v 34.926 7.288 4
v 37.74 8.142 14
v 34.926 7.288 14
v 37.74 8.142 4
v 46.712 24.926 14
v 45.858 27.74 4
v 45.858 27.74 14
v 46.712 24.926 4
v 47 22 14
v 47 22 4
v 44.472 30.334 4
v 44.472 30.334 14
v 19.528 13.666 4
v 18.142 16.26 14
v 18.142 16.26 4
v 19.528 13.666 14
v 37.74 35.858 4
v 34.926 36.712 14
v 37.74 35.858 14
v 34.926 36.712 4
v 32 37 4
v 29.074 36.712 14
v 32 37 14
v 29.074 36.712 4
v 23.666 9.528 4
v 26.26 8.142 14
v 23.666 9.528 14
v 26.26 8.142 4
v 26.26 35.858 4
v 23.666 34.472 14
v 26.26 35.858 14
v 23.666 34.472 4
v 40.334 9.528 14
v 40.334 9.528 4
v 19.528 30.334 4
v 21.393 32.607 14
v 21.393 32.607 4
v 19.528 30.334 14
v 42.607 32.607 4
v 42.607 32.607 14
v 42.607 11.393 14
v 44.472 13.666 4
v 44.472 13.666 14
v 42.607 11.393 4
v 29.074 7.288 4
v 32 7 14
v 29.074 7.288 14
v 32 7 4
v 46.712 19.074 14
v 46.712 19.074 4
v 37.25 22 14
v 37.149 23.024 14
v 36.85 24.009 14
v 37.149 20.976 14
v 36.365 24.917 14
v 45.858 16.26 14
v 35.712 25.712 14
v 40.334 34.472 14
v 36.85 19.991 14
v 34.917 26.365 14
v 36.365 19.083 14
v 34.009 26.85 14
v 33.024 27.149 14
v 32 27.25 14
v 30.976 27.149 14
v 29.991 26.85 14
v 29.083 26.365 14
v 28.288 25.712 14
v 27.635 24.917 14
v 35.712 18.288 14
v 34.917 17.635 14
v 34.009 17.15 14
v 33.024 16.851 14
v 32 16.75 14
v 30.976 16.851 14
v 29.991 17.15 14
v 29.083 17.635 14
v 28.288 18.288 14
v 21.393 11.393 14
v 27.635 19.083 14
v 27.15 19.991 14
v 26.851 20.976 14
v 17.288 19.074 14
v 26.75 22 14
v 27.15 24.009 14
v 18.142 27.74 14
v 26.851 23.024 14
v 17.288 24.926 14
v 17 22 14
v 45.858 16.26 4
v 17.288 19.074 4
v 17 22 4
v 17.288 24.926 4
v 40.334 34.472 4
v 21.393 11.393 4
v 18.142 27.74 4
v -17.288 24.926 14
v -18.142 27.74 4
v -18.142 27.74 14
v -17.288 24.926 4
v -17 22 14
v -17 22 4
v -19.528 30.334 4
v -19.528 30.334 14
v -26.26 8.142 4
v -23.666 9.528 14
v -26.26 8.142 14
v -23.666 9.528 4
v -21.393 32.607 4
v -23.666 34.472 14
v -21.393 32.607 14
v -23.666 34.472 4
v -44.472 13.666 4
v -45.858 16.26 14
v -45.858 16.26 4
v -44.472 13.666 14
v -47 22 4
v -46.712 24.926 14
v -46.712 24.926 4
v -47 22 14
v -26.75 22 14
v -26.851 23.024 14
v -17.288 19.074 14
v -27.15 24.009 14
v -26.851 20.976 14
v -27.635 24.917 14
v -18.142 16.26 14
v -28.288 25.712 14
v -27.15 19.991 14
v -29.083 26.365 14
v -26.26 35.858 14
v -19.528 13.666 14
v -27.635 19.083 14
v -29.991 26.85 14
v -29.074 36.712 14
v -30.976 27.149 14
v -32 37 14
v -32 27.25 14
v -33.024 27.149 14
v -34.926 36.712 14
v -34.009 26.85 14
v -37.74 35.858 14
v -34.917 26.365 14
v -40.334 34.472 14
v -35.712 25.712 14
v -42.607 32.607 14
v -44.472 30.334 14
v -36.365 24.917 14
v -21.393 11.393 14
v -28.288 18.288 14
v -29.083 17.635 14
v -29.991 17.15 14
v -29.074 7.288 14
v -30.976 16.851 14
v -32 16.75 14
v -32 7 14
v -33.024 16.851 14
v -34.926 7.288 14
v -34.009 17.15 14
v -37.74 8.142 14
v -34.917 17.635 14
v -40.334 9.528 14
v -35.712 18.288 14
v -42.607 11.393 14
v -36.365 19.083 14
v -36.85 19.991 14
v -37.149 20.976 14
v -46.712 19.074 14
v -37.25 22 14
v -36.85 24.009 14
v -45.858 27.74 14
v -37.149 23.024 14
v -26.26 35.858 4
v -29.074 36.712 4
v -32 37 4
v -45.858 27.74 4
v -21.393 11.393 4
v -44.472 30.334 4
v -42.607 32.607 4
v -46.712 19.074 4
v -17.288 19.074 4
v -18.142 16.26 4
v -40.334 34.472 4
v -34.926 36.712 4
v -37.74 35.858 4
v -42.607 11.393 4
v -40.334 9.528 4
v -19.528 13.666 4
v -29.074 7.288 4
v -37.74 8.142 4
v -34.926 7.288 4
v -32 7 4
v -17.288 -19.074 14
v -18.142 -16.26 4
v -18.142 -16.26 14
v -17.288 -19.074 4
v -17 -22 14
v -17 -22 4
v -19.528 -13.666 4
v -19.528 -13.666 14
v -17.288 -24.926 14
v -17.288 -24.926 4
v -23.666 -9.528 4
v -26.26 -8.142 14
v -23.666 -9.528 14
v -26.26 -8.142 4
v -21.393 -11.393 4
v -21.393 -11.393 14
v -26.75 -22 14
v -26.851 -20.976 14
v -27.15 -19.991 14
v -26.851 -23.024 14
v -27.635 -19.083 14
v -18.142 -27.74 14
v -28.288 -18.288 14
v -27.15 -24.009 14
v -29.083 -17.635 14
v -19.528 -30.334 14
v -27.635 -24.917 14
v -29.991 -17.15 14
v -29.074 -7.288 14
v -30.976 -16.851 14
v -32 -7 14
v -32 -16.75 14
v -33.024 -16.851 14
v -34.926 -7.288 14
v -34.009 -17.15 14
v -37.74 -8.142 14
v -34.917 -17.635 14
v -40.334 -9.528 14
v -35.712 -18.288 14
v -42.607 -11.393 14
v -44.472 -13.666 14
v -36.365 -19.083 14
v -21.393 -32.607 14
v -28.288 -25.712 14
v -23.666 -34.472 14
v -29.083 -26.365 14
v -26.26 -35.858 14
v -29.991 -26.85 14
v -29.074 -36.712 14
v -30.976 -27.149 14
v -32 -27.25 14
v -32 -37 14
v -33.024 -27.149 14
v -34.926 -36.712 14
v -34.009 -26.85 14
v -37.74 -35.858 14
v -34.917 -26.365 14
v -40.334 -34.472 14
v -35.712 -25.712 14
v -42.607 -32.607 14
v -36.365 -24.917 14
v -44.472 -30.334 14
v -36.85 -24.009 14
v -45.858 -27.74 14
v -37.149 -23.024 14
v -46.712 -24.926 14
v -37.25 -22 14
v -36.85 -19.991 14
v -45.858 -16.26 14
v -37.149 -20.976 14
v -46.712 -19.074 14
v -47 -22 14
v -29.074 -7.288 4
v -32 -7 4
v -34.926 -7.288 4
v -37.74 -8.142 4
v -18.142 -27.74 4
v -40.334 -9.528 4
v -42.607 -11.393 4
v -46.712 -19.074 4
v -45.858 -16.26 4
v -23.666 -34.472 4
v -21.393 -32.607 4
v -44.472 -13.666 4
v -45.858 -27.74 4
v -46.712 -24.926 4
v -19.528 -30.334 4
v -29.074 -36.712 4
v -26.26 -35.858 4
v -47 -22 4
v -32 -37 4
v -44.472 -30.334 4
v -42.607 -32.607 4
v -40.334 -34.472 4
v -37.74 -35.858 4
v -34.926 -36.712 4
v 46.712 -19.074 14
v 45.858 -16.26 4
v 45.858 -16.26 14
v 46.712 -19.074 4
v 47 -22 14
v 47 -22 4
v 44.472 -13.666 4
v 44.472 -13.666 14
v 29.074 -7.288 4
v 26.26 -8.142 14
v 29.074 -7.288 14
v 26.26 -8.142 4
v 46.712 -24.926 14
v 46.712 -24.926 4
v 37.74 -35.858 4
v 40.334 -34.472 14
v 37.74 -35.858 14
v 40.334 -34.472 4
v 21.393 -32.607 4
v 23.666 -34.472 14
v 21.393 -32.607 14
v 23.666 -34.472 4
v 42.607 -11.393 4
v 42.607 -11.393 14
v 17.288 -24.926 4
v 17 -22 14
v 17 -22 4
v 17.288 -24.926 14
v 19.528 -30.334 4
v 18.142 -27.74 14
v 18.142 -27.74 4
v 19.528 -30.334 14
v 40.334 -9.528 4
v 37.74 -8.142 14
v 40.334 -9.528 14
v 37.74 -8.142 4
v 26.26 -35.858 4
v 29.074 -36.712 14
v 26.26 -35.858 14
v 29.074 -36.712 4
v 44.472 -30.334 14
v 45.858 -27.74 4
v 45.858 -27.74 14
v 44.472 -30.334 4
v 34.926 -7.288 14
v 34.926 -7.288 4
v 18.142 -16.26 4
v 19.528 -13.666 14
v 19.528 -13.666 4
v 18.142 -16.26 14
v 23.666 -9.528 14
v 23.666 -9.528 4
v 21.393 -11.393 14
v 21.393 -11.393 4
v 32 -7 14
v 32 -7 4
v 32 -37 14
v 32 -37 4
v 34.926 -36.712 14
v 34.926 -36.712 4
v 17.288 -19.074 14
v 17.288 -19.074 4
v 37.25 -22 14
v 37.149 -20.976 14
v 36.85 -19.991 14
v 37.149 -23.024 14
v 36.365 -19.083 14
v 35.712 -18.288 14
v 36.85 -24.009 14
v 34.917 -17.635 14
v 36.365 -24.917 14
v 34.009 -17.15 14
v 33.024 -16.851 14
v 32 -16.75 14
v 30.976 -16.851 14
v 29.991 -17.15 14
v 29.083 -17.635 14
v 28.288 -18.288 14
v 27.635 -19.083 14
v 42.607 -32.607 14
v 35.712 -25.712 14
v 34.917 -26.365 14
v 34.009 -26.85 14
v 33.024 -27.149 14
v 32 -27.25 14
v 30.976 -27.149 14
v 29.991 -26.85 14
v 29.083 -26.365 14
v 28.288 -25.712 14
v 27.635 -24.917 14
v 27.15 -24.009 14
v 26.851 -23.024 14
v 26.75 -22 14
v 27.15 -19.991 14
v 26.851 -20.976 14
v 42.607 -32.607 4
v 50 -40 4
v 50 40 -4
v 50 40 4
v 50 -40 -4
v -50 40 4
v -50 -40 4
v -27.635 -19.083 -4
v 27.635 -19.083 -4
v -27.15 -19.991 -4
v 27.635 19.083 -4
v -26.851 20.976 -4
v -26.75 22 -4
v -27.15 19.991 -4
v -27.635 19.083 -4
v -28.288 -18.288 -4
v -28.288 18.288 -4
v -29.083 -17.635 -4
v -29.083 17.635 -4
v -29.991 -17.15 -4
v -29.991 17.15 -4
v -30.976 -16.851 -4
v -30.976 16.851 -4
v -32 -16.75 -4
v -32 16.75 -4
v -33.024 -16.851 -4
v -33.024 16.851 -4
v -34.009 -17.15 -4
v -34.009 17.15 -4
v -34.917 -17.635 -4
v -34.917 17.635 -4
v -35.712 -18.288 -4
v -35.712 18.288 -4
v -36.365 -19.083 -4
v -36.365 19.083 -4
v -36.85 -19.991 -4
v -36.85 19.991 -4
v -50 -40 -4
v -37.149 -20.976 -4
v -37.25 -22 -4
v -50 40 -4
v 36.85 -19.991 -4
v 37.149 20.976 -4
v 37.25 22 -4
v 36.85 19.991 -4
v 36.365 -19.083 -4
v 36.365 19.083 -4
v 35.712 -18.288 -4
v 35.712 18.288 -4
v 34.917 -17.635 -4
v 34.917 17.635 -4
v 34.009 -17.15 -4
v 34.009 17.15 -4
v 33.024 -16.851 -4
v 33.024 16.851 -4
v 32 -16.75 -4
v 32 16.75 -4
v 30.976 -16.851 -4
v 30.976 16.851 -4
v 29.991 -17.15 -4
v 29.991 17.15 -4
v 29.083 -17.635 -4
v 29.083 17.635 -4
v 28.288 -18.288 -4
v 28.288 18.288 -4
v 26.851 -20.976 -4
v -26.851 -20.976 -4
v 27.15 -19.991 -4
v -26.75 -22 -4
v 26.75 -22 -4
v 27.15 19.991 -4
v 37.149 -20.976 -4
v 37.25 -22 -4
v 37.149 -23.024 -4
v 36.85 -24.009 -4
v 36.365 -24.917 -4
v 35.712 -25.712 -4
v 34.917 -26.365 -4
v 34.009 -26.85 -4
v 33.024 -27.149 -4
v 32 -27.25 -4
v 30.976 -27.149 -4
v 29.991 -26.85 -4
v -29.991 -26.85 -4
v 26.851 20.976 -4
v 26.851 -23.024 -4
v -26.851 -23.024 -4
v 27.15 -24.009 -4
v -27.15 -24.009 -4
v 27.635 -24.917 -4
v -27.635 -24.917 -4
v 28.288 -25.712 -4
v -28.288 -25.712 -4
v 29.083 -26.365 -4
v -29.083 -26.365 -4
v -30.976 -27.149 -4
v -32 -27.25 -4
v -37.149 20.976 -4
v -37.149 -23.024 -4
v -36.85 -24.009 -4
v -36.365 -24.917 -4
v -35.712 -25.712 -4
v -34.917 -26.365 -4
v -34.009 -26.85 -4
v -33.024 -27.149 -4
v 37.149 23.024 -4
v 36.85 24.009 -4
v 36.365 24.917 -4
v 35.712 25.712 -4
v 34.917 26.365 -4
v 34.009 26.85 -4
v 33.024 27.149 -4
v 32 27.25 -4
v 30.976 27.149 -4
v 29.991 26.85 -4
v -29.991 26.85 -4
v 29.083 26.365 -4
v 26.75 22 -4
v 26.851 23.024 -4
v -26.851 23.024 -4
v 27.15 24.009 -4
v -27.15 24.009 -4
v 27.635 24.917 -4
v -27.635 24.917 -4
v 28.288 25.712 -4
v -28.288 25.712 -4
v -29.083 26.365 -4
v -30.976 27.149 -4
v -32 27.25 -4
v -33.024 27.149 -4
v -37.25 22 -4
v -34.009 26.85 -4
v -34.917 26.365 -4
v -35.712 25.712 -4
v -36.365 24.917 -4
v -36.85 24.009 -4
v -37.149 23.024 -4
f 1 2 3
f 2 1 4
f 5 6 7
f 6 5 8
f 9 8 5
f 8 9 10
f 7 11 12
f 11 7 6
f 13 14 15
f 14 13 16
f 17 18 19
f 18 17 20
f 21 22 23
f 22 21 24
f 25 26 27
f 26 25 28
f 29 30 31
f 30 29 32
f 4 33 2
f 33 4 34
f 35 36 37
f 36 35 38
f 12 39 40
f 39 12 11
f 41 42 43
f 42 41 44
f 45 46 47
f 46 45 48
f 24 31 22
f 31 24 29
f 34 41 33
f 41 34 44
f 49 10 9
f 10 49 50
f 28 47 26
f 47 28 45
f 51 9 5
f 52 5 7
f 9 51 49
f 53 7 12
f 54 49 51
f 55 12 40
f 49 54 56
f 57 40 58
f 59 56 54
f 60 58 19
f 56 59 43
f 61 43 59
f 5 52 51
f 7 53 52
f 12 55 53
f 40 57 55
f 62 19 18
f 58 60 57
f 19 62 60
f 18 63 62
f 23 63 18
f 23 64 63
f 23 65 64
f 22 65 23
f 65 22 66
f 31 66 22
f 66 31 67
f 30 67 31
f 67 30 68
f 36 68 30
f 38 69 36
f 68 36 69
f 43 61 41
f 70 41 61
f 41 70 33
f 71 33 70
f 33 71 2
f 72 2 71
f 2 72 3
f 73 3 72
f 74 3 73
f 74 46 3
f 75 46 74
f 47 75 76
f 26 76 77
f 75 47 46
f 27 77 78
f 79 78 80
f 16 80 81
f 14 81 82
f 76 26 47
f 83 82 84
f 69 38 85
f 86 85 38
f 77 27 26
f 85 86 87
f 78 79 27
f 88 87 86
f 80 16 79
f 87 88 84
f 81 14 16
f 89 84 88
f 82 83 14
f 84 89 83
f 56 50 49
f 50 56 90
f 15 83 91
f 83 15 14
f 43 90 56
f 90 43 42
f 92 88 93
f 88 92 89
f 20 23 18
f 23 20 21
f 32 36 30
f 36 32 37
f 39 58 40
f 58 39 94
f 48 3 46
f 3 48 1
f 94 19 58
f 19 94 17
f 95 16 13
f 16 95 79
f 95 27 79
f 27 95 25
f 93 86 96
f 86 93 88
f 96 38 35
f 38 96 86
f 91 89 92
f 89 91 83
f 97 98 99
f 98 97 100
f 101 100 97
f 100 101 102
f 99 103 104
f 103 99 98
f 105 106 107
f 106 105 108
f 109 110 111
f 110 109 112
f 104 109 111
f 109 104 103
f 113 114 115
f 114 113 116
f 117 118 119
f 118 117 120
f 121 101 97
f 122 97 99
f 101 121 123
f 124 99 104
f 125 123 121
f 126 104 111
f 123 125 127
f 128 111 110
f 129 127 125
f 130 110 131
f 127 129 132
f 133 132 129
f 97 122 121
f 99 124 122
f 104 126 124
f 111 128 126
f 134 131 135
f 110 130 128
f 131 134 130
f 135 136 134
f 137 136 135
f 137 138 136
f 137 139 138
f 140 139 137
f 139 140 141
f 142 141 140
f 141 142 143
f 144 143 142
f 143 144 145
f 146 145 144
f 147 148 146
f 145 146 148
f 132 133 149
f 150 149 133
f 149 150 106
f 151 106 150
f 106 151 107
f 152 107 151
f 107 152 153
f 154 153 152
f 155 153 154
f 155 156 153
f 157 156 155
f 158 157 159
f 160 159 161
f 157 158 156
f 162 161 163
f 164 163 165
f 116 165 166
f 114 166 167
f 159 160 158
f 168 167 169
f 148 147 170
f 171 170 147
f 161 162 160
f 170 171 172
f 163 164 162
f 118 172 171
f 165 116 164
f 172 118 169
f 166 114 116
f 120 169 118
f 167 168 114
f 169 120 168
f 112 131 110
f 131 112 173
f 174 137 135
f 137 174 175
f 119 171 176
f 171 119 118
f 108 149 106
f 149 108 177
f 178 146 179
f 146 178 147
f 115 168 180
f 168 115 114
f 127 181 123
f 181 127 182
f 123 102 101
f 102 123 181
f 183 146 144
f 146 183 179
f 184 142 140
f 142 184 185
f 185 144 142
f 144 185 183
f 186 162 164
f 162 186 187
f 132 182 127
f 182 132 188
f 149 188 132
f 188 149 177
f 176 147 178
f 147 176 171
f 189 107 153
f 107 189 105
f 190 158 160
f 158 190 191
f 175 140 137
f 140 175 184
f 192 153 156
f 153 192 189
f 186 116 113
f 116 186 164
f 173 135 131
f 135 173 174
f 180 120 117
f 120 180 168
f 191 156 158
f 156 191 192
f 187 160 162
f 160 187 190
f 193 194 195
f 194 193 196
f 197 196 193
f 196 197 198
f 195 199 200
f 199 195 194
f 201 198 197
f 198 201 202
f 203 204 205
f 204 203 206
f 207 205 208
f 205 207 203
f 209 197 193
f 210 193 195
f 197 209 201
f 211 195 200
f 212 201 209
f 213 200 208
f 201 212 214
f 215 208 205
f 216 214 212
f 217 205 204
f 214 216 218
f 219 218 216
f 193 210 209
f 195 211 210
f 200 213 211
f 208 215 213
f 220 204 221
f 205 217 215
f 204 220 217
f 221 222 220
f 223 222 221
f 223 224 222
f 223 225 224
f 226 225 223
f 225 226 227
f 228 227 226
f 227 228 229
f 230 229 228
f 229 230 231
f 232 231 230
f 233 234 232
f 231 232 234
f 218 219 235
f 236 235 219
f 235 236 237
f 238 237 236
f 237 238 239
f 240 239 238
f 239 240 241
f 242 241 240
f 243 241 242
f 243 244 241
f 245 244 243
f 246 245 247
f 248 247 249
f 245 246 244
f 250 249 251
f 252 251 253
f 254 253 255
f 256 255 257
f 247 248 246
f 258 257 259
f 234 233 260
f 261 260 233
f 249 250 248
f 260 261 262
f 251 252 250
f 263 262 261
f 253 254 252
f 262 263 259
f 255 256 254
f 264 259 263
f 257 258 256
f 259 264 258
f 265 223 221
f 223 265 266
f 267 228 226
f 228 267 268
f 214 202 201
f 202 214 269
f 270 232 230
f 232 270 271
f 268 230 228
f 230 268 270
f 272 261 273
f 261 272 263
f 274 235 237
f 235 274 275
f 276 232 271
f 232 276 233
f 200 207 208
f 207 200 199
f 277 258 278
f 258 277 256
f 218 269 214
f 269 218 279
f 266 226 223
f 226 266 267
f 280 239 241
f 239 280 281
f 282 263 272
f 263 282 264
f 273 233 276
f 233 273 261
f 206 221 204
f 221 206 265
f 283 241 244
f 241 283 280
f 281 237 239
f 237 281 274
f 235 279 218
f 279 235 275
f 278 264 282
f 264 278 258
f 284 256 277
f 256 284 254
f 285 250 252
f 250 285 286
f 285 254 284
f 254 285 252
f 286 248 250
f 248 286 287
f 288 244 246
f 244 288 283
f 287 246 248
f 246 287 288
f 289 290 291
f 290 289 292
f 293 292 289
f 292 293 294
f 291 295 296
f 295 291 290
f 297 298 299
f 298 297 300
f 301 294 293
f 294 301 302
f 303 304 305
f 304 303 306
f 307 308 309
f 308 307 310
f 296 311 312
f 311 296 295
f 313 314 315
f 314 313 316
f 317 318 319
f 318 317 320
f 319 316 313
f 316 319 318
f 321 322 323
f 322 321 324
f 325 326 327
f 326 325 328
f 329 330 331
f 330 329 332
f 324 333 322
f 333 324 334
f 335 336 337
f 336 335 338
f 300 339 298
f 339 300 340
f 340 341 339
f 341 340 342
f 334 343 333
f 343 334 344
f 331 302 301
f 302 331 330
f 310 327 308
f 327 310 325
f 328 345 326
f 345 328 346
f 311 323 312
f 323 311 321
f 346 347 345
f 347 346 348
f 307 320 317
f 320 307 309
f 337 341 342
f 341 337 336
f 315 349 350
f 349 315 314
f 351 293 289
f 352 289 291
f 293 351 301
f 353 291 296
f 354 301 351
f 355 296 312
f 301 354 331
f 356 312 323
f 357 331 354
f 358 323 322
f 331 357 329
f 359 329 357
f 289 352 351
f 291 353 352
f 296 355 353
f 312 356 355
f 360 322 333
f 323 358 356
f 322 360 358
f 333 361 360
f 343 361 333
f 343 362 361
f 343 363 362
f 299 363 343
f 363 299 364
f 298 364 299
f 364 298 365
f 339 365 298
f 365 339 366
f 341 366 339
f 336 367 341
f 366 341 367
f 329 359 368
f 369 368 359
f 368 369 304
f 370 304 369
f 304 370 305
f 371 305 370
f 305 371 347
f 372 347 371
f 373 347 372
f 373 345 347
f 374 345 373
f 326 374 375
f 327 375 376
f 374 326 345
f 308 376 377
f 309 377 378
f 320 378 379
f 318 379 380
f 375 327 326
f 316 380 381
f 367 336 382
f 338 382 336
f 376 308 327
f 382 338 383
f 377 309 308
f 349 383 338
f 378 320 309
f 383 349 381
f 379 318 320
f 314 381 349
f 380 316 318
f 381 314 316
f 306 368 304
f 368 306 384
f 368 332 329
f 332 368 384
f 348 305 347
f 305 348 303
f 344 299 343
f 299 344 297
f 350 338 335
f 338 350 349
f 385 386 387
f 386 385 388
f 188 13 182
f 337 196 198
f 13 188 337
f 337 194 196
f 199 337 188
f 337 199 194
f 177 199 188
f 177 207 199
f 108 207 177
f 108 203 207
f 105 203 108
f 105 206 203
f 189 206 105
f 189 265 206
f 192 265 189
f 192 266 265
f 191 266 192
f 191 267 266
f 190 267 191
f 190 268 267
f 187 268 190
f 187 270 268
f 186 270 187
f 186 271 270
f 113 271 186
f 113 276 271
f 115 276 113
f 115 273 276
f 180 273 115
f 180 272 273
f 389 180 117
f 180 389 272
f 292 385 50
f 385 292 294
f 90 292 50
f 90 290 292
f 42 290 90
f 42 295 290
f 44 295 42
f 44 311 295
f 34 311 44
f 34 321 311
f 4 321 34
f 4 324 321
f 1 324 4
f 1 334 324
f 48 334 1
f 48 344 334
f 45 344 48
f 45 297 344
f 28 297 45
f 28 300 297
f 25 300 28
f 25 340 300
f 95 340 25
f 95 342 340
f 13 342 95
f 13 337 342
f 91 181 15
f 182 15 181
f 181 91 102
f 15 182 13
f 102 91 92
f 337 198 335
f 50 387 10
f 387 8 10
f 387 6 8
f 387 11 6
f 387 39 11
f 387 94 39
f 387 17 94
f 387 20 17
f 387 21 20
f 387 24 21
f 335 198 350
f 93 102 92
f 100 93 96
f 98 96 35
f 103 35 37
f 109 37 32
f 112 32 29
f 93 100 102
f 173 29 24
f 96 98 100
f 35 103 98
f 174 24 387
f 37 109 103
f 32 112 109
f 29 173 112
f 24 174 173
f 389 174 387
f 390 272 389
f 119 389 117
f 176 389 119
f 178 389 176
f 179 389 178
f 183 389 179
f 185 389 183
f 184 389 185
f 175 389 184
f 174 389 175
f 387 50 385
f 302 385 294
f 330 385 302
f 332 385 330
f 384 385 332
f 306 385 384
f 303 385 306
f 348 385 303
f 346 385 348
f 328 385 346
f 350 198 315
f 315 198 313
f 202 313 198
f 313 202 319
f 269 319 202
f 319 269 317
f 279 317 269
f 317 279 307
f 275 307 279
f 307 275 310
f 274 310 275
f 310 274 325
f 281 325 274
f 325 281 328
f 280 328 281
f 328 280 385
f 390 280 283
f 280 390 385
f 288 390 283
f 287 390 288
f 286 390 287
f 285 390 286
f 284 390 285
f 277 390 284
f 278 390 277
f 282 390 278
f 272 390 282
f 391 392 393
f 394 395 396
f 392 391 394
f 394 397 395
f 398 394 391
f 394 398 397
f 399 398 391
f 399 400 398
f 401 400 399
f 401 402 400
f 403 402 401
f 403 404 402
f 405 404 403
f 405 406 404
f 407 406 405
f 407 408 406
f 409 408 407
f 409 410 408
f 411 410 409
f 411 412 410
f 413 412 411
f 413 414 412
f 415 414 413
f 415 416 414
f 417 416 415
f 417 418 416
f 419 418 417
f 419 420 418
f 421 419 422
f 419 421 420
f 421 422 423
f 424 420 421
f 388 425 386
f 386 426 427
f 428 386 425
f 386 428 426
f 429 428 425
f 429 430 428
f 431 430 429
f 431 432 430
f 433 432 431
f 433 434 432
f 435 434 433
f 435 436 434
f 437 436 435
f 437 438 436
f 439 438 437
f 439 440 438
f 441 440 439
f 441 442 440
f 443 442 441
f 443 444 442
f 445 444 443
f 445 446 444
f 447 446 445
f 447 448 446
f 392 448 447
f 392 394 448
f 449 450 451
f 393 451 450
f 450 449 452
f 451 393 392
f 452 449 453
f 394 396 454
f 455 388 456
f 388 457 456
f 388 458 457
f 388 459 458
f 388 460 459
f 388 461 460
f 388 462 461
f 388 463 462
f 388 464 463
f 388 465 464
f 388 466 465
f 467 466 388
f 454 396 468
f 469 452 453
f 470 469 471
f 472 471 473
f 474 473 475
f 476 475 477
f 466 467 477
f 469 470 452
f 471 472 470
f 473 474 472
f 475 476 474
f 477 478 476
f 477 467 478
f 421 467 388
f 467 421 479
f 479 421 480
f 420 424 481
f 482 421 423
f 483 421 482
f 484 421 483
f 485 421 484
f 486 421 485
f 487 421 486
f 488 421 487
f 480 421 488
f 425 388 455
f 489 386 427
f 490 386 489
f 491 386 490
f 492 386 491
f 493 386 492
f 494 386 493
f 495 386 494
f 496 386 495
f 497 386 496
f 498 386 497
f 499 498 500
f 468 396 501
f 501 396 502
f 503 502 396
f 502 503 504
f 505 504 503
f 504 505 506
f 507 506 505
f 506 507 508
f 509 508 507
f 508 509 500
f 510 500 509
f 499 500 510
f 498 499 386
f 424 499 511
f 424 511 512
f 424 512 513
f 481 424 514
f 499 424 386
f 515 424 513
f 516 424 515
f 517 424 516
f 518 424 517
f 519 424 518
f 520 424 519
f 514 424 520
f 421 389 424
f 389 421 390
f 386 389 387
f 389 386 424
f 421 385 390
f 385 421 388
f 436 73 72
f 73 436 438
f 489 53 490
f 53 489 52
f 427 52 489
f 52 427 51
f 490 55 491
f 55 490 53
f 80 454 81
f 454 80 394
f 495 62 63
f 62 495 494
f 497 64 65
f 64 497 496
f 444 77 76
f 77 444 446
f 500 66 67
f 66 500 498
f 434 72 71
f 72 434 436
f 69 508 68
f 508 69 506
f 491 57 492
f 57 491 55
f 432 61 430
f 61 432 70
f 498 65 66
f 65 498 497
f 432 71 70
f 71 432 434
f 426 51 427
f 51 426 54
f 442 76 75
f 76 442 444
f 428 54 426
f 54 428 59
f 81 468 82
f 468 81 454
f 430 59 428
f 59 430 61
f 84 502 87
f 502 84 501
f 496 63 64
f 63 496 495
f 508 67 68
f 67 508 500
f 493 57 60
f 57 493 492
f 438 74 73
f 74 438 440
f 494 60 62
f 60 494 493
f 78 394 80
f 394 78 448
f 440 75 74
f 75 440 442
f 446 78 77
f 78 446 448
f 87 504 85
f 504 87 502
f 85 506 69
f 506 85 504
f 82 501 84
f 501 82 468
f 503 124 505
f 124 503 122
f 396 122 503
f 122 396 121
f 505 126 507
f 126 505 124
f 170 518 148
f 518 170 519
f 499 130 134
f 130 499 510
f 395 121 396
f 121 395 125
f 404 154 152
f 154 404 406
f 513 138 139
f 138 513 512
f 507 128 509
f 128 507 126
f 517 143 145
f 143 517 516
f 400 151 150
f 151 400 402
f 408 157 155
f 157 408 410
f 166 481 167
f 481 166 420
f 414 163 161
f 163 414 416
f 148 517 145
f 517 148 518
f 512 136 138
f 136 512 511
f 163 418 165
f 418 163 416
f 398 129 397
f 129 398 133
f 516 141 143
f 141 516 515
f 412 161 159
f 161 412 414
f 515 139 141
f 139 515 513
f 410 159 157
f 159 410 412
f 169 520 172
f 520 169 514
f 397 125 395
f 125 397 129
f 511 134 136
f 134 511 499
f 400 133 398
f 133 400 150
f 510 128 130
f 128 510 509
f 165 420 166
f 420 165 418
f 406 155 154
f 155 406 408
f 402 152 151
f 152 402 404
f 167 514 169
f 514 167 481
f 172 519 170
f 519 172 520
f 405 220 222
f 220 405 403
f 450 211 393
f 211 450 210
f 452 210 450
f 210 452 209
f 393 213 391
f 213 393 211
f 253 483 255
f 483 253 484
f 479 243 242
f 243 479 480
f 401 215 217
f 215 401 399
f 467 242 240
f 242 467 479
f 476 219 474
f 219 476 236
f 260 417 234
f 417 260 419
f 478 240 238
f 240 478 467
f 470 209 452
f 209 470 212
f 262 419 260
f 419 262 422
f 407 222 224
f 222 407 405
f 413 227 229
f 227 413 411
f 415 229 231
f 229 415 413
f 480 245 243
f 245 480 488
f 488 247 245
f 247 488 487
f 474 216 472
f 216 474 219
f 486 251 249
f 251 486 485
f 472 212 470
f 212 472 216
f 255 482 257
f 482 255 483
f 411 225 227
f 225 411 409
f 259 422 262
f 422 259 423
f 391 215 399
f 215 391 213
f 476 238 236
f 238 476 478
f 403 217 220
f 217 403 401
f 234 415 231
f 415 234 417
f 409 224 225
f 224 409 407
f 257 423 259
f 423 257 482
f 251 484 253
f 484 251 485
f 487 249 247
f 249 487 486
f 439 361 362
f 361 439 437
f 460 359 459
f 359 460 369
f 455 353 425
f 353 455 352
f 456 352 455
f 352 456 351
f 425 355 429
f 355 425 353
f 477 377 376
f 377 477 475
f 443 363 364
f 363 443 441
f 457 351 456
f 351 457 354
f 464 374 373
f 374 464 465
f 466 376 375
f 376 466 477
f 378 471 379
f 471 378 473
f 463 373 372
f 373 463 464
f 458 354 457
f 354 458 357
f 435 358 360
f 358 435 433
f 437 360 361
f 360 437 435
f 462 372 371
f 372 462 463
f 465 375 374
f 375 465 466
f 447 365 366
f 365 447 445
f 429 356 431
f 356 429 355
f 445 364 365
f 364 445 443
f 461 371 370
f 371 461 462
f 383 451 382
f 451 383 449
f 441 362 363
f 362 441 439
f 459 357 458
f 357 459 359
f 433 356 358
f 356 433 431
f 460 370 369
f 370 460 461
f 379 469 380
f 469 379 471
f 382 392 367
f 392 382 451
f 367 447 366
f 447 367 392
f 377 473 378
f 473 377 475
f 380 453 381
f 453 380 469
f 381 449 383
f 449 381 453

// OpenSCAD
$fn = 32;

// ----------------------------------------------------------------------
// Anchor pads 100 x 80 x 18
// four corner bosses with anchor holes
// ----------------------------------------------------------------------

// --- parameters (mm) ---
plate = [100, 80, 8];  // base plate size (x, y, z)
pads = 4;              // boss count, one per corner
edge = 18;             // boss centre offset from the plate edge
boss_d = 30;           // boss diameter
boss_h = 10;           // boss height above the base plate
hole_d = 10.5;         // hole diameter

// --- derived feature positions (mm) ---
height = plate[2] + boss_h;      // = 18   overall height of the part
corner_x = plate[0] / 2 - edge;  // = 32   boss centre X
corner_y = plate[1] / 2 - edge;  // = 22   boss centre Y
feature_centers = [
  [corner_x, corner_y],
  [-corner_x, corner_y],
  [-corner_x, -corner_y],
  [corner_x, -corner_y]
];   // boss centres, anchor holes are drilled there

// base plate, four bosses standing on it, anchor holes all the way through
difference() {
  union() {
    cube(plate, center = true);
    for (centre = feature_centers)
      translate([centre[0], centre[1], plate[2] / 2 - 1])
        cylinder(d = boss_d, h = boss_h + 1);
  }
  for (centre = feature_centers)
    translate([centre[0], centre[1], -height])
      cylinder(d = hole_d, h = 2 * height + 2);  // through boss and plate
}
